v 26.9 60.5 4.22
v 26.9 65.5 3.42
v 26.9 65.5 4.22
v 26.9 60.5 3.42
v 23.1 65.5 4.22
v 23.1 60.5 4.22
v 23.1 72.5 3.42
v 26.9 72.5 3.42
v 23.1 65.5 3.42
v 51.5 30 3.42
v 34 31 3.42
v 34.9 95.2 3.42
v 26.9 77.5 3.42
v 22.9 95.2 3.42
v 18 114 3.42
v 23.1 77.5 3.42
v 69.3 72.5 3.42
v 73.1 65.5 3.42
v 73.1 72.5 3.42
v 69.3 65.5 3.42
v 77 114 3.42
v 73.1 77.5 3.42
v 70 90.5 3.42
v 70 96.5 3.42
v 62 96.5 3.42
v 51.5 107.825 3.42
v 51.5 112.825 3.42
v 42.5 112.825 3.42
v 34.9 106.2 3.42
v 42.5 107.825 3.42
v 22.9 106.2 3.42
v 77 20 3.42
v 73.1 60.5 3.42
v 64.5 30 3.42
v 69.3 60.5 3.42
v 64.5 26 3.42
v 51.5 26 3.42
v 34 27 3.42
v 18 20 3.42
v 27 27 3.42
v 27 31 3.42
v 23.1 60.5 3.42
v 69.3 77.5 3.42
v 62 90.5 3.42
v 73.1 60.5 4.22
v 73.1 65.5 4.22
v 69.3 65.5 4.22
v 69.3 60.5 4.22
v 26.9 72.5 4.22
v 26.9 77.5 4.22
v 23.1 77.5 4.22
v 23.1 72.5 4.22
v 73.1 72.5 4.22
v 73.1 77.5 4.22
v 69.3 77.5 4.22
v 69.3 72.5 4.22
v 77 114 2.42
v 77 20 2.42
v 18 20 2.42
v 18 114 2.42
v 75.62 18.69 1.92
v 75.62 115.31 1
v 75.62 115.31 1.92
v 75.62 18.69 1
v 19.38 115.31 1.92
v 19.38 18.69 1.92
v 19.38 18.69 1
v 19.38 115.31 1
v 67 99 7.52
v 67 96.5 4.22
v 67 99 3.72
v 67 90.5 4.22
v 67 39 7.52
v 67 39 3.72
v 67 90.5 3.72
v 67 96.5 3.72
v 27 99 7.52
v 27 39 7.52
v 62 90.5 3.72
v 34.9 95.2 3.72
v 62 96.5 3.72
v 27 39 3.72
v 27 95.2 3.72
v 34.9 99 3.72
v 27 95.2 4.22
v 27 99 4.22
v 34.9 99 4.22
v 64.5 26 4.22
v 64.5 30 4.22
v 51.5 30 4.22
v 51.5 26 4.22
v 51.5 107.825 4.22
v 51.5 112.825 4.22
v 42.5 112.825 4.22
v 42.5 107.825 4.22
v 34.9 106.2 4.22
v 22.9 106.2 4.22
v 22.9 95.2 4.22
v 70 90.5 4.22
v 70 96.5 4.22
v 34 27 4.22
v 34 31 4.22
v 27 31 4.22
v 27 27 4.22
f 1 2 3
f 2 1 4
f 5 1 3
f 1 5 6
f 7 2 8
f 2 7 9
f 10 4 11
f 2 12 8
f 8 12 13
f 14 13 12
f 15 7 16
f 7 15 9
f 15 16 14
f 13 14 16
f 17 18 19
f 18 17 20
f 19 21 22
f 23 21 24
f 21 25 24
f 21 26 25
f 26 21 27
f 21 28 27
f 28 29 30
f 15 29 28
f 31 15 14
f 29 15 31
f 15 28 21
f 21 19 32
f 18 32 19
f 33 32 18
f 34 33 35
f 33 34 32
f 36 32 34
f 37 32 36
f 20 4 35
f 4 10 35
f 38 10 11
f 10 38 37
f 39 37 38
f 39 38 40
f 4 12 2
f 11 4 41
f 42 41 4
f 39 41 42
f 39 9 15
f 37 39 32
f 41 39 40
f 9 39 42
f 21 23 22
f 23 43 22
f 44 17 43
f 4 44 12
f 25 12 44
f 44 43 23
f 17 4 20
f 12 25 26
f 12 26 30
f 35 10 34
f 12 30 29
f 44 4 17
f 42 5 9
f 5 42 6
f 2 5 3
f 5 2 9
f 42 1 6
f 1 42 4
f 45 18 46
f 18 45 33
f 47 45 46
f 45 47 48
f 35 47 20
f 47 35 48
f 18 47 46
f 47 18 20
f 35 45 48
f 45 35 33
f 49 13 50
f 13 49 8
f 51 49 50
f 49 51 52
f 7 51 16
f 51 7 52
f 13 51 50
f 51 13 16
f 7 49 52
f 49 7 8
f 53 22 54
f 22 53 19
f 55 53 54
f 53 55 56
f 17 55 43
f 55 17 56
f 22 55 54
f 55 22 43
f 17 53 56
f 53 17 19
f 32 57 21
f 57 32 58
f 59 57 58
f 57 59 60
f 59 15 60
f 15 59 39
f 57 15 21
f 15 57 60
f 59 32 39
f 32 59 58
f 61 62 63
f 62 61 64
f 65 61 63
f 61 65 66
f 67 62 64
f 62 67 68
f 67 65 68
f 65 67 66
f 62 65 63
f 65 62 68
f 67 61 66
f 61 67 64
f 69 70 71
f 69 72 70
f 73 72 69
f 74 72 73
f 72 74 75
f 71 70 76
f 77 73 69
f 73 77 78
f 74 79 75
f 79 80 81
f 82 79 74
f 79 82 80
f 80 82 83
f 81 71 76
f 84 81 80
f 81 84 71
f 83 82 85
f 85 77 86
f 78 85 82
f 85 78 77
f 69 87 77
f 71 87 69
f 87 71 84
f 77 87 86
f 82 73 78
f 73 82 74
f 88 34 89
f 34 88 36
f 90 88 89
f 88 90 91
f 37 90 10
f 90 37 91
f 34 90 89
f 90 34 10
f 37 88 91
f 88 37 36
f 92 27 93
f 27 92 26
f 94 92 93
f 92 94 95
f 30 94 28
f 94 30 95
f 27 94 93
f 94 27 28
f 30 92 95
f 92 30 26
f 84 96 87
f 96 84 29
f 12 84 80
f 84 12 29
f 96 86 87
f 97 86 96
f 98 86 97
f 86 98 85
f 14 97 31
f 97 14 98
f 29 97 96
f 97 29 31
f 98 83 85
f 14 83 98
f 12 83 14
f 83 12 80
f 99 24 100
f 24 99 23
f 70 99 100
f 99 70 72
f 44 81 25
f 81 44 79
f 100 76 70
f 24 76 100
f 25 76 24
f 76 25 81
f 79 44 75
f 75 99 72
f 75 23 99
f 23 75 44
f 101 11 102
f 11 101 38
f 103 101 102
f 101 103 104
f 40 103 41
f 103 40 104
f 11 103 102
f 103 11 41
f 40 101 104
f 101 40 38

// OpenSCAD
// ENKU Reader mechanical envelope study — NOT a manufacturing model
// All coordinates in mm, based on KiCad R0.1 placements (2026-10-08).
// Open in OpenSCAD; F5 preview, F6 render. Change parameters to explore.
$fn=24;
pcb_x0=18; pcb_y0=20; pcb_w=59; pcb_h=94; pcb_t=1.0;
case_target=10; front_t=1.0; rear_t=1.0;
display_w=56.24; display_h=96.62; display_t=0.92;
support_gap=0.5; battery_t=3.8; battery_w=40; battery_h=60;
battery_x=27; battery_y=39; // PROVISIONAL envelope, NOT placement approval
// KiCad coordinate y increases down the board; this mockup uses same xy.
module slab(x,y,z,w,h,t,c){color(c) translate([x,y,z]) cube([w,h,t]);}
slab(pcb_x0,pcb_y0,front_t+display_t+support_gap,pcb_w,pcb_h,pcb_t,[0.08,0.42,0.35]);
slab((pcb_x0+pcb_w/2)-display_w/2,(pcb_y0+pcb_h/2)-display_h/2,front_t,display_w,display_h,display_t,[0.75,0.75,0.70]);
slab(battery_x,battery_y,front_t+display_t+support_gap+pcb_t+0.3,battery_w,battery_h,battery_t,[0.28,0.50,0.70,0.65]);
// Board outline / major connectors and placeholder switches
module marker(x,y,w,h,label_color){slab(x-w/2,y-h/2,front_t+display_t+support_gap+pcb_t,w,h,0.8,label_color);}
marker(58,28,13,4,[0.85,0.55,0.2]); // J3 FPC
marker(47,110.325,9,5,[0.75,0.75,0.8]); // J5 USB-C
marker(28.9,100.7,12,11,[0.85,0.5,0.2]); // J2 microSD, rotated
marker(66,93.5,8,6,[0.85,0.5,0.2]); // J1 battery
marker(30.5,29,7,4,[0.85,0.2,0.2]); // SW1 placeholder
for (y=[63,75]) {
  marker(25,y,3.8,5,[0.9,0.7,0.2]);
  marker(71.2,y,3.8,5,[0.9,0.7,0.2]);
}
// Reference only: do NOT infer collision-free design from this envelope.
// Battery overlaps some markers in XY; actual component bodies and routing
// must be imported from KiCad before locking its position.
echo("Nominal stack (no high components) =",front_t+display_t+support_gap+pcb_t+0.3+battery_t+rear_t);
echo("Remaining from 10 mm target =",case_target-(front_t+display_t+support_gap+pcb_t+0.3+battery_t+rear_t));
